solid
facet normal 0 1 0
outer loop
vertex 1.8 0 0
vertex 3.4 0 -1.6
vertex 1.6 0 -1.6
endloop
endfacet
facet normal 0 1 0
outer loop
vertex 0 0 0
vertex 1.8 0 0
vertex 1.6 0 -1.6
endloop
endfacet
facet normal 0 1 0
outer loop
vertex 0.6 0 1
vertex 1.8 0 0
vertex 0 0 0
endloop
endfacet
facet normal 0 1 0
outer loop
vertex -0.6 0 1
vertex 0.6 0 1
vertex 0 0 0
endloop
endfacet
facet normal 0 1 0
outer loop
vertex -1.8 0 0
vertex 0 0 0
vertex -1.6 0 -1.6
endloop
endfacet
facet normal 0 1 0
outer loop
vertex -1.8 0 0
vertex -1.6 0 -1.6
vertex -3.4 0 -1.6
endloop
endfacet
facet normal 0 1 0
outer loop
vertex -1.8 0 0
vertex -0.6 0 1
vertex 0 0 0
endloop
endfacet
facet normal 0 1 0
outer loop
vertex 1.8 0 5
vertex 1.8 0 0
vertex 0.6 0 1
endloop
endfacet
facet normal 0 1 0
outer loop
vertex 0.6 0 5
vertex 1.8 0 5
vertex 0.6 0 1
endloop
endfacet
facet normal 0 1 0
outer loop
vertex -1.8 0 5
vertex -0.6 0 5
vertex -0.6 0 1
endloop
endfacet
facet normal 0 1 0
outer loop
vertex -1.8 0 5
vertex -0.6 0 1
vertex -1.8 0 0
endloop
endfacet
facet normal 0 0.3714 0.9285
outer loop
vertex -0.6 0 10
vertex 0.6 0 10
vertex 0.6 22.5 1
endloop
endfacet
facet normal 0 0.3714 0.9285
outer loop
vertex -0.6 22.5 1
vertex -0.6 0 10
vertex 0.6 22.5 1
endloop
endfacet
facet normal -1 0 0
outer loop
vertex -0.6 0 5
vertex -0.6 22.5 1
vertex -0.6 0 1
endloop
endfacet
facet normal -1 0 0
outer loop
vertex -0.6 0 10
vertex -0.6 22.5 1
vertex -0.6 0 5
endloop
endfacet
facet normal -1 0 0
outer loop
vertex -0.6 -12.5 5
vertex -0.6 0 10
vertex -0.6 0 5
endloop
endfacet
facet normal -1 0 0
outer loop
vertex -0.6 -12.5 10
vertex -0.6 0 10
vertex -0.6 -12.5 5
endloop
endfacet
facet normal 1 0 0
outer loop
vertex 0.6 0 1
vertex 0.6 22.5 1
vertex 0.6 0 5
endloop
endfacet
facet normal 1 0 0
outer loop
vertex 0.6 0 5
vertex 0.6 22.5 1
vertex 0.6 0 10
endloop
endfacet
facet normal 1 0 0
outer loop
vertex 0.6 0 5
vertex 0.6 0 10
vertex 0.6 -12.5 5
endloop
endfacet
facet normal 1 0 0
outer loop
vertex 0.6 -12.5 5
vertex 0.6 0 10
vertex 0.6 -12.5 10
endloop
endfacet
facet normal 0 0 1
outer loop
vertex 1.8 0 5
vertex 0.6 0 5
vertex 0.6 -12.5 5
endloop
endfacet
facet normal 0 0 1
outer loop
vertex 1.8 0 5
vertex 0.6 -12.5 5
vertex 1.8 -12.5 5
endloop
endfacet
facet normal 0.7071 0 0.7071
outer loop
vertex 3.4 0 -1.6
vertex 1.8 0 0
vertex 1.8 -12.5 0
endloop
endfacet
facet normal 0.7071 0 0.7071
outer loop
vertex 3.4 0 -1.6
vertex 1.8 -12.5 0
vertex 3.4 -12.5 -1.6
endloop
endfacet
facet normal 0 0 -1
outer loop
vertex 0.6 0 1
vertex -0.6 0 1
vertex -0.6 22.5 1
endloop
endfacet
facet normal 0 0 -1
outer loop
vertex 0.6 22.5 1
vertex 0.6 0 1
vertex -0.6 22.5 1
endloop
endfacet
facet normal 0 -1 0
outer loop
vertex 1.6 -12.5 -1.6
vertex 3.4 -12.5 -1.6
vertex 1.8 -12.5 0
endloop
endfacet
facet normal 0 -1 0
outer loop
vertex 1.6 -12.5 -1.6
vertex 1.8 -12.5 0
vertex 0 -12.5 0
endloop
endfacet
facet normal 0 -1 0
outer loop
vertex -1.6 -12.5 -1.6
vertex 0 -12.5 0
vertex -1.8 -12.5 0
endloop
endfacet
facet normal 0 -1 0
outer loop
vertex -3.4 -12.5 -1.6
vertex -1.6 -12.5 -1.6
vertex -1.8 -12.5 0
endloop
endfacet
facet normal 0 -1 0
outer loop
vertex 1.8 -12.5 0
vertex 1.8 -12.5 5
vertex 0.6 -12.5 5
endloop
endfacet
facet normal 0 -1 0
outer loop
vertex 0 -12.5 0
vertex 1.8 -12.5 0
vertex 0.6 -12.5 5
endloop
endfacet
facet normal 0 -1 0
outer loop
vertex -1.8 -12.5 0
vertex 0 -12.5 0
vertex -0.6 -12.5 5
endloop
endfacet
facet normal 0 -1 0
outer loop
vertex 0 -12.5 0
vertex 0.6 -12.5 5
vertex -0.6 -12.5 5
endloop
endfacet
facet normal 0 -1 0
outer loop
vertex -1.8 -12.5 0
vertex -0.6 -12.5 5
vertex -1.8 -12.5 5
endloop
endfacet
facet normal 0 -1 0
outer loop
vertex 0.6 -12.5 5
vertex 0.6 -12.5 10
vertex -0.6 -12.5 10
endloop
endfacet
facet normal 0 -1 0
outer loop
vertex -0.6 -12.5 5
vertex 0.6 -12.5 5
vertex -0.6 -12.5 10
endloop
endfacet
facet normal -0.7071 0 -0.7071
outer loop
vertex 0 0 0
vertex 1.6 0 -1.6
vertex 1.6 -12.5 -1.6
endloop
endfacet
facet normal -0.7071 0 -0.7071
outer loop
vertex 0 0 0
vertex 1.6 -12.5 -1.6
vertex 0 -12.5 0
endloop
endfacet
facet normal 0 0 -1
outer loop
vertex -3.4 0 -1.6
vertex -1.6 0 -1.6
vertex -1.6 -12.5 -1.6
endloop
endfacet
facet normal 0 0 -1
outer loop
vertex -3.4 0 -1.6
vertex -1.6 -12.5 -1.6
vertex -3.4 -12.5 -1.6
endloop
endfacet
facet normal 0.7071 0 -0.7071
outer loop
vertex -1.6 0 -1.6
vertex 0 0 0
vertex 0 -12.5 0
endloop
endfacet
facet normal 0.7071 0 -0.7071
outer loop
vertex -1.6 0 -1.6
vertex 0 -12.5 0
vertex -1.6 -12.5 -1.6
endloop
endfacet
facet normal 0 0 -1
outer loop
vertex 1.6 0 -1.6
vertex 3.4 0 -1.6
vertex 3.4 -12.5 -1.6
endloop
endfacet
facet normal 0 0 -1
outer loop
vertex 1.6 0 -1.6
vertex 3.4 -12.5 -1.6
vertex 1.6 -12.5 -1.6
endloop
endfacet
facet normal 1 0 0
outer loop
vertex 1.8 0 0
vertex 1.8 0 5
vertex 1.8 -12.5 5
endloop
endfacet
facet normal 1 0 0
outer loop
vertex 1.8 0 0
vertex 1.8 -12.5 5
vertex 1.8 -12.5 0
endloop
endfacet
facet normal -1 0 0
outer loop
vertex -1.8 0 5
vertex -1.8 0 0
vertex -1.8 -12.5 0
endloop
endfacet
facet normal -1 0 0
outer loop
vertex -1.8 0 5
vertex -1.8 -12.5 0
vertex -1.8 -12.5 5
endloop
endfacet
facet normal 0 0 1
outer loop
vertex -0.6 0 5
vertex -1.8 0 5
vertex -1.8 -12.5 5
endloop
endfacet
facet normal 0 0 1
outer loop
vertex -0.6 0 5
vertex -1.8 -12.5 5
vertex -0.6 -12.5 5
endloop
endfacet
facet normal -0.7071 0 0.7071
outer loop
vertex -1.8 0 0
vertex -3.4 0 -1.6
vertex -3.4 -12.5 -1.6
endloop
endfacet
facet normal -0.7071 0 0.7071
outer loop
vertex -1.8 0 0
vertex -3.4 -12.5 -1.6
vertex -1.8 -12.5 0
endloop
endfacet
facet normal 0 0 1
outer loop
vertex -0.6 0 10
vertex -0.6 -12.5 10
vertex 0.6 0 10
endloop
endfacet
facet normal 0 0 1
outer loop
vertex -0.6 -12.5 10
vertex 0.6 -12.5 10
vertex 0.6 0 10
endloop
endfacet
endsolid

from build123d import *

# Parameters (mm, degrees)
PAD_DEPTH         = 0.6
PAD001_DEPTH      = 12.5
SKETCH002_W       = 30
SKETCH002_H       = 1
POCKET_DEPTH      = 3.401
POCKET_DEPTH_BACK = 3.401


with BuildPart() as part:
    # Sketch → Pad (new body, symmetric)
    with BuildSketch(Plane.YZ):
        Polygon((0, 0), (-12.5, 0), (-12.5, 10), (0, 10), (25, 0), align=None)
    extrude(amount=PAD_DEPTH, both=True)

    # Sketch001 → Pad001 (join)
    with BuildSketch(Plane.XZ):
        Polygon((1.8, 0), (3.4, -1.6), (1.6, -1.6), (0, 0), (-1.6, -1.6), (-3.4, -1.6), (-1.8, 0), (-1.8, 5), (1.8, 5), align=None)
    extrude(amount=PAD001_DEPTH)

    # Sketch002 → Pocket (cut, two sides)
    with BuildSketch(Plane.YZ) as pocket_sk:
        with Locations((15, 0.5)):
            Rectangle(SKETCH002_W, SKETCH002_H)
    extrude(amount=-POCKET_DEPTH, mode=Mode.SUBTRACT)
    extrude(pocket_sk.sketch, amount=POCKET_DEPTH_BACK, mode=Mode.SUBTRACT)


solid = part.part
